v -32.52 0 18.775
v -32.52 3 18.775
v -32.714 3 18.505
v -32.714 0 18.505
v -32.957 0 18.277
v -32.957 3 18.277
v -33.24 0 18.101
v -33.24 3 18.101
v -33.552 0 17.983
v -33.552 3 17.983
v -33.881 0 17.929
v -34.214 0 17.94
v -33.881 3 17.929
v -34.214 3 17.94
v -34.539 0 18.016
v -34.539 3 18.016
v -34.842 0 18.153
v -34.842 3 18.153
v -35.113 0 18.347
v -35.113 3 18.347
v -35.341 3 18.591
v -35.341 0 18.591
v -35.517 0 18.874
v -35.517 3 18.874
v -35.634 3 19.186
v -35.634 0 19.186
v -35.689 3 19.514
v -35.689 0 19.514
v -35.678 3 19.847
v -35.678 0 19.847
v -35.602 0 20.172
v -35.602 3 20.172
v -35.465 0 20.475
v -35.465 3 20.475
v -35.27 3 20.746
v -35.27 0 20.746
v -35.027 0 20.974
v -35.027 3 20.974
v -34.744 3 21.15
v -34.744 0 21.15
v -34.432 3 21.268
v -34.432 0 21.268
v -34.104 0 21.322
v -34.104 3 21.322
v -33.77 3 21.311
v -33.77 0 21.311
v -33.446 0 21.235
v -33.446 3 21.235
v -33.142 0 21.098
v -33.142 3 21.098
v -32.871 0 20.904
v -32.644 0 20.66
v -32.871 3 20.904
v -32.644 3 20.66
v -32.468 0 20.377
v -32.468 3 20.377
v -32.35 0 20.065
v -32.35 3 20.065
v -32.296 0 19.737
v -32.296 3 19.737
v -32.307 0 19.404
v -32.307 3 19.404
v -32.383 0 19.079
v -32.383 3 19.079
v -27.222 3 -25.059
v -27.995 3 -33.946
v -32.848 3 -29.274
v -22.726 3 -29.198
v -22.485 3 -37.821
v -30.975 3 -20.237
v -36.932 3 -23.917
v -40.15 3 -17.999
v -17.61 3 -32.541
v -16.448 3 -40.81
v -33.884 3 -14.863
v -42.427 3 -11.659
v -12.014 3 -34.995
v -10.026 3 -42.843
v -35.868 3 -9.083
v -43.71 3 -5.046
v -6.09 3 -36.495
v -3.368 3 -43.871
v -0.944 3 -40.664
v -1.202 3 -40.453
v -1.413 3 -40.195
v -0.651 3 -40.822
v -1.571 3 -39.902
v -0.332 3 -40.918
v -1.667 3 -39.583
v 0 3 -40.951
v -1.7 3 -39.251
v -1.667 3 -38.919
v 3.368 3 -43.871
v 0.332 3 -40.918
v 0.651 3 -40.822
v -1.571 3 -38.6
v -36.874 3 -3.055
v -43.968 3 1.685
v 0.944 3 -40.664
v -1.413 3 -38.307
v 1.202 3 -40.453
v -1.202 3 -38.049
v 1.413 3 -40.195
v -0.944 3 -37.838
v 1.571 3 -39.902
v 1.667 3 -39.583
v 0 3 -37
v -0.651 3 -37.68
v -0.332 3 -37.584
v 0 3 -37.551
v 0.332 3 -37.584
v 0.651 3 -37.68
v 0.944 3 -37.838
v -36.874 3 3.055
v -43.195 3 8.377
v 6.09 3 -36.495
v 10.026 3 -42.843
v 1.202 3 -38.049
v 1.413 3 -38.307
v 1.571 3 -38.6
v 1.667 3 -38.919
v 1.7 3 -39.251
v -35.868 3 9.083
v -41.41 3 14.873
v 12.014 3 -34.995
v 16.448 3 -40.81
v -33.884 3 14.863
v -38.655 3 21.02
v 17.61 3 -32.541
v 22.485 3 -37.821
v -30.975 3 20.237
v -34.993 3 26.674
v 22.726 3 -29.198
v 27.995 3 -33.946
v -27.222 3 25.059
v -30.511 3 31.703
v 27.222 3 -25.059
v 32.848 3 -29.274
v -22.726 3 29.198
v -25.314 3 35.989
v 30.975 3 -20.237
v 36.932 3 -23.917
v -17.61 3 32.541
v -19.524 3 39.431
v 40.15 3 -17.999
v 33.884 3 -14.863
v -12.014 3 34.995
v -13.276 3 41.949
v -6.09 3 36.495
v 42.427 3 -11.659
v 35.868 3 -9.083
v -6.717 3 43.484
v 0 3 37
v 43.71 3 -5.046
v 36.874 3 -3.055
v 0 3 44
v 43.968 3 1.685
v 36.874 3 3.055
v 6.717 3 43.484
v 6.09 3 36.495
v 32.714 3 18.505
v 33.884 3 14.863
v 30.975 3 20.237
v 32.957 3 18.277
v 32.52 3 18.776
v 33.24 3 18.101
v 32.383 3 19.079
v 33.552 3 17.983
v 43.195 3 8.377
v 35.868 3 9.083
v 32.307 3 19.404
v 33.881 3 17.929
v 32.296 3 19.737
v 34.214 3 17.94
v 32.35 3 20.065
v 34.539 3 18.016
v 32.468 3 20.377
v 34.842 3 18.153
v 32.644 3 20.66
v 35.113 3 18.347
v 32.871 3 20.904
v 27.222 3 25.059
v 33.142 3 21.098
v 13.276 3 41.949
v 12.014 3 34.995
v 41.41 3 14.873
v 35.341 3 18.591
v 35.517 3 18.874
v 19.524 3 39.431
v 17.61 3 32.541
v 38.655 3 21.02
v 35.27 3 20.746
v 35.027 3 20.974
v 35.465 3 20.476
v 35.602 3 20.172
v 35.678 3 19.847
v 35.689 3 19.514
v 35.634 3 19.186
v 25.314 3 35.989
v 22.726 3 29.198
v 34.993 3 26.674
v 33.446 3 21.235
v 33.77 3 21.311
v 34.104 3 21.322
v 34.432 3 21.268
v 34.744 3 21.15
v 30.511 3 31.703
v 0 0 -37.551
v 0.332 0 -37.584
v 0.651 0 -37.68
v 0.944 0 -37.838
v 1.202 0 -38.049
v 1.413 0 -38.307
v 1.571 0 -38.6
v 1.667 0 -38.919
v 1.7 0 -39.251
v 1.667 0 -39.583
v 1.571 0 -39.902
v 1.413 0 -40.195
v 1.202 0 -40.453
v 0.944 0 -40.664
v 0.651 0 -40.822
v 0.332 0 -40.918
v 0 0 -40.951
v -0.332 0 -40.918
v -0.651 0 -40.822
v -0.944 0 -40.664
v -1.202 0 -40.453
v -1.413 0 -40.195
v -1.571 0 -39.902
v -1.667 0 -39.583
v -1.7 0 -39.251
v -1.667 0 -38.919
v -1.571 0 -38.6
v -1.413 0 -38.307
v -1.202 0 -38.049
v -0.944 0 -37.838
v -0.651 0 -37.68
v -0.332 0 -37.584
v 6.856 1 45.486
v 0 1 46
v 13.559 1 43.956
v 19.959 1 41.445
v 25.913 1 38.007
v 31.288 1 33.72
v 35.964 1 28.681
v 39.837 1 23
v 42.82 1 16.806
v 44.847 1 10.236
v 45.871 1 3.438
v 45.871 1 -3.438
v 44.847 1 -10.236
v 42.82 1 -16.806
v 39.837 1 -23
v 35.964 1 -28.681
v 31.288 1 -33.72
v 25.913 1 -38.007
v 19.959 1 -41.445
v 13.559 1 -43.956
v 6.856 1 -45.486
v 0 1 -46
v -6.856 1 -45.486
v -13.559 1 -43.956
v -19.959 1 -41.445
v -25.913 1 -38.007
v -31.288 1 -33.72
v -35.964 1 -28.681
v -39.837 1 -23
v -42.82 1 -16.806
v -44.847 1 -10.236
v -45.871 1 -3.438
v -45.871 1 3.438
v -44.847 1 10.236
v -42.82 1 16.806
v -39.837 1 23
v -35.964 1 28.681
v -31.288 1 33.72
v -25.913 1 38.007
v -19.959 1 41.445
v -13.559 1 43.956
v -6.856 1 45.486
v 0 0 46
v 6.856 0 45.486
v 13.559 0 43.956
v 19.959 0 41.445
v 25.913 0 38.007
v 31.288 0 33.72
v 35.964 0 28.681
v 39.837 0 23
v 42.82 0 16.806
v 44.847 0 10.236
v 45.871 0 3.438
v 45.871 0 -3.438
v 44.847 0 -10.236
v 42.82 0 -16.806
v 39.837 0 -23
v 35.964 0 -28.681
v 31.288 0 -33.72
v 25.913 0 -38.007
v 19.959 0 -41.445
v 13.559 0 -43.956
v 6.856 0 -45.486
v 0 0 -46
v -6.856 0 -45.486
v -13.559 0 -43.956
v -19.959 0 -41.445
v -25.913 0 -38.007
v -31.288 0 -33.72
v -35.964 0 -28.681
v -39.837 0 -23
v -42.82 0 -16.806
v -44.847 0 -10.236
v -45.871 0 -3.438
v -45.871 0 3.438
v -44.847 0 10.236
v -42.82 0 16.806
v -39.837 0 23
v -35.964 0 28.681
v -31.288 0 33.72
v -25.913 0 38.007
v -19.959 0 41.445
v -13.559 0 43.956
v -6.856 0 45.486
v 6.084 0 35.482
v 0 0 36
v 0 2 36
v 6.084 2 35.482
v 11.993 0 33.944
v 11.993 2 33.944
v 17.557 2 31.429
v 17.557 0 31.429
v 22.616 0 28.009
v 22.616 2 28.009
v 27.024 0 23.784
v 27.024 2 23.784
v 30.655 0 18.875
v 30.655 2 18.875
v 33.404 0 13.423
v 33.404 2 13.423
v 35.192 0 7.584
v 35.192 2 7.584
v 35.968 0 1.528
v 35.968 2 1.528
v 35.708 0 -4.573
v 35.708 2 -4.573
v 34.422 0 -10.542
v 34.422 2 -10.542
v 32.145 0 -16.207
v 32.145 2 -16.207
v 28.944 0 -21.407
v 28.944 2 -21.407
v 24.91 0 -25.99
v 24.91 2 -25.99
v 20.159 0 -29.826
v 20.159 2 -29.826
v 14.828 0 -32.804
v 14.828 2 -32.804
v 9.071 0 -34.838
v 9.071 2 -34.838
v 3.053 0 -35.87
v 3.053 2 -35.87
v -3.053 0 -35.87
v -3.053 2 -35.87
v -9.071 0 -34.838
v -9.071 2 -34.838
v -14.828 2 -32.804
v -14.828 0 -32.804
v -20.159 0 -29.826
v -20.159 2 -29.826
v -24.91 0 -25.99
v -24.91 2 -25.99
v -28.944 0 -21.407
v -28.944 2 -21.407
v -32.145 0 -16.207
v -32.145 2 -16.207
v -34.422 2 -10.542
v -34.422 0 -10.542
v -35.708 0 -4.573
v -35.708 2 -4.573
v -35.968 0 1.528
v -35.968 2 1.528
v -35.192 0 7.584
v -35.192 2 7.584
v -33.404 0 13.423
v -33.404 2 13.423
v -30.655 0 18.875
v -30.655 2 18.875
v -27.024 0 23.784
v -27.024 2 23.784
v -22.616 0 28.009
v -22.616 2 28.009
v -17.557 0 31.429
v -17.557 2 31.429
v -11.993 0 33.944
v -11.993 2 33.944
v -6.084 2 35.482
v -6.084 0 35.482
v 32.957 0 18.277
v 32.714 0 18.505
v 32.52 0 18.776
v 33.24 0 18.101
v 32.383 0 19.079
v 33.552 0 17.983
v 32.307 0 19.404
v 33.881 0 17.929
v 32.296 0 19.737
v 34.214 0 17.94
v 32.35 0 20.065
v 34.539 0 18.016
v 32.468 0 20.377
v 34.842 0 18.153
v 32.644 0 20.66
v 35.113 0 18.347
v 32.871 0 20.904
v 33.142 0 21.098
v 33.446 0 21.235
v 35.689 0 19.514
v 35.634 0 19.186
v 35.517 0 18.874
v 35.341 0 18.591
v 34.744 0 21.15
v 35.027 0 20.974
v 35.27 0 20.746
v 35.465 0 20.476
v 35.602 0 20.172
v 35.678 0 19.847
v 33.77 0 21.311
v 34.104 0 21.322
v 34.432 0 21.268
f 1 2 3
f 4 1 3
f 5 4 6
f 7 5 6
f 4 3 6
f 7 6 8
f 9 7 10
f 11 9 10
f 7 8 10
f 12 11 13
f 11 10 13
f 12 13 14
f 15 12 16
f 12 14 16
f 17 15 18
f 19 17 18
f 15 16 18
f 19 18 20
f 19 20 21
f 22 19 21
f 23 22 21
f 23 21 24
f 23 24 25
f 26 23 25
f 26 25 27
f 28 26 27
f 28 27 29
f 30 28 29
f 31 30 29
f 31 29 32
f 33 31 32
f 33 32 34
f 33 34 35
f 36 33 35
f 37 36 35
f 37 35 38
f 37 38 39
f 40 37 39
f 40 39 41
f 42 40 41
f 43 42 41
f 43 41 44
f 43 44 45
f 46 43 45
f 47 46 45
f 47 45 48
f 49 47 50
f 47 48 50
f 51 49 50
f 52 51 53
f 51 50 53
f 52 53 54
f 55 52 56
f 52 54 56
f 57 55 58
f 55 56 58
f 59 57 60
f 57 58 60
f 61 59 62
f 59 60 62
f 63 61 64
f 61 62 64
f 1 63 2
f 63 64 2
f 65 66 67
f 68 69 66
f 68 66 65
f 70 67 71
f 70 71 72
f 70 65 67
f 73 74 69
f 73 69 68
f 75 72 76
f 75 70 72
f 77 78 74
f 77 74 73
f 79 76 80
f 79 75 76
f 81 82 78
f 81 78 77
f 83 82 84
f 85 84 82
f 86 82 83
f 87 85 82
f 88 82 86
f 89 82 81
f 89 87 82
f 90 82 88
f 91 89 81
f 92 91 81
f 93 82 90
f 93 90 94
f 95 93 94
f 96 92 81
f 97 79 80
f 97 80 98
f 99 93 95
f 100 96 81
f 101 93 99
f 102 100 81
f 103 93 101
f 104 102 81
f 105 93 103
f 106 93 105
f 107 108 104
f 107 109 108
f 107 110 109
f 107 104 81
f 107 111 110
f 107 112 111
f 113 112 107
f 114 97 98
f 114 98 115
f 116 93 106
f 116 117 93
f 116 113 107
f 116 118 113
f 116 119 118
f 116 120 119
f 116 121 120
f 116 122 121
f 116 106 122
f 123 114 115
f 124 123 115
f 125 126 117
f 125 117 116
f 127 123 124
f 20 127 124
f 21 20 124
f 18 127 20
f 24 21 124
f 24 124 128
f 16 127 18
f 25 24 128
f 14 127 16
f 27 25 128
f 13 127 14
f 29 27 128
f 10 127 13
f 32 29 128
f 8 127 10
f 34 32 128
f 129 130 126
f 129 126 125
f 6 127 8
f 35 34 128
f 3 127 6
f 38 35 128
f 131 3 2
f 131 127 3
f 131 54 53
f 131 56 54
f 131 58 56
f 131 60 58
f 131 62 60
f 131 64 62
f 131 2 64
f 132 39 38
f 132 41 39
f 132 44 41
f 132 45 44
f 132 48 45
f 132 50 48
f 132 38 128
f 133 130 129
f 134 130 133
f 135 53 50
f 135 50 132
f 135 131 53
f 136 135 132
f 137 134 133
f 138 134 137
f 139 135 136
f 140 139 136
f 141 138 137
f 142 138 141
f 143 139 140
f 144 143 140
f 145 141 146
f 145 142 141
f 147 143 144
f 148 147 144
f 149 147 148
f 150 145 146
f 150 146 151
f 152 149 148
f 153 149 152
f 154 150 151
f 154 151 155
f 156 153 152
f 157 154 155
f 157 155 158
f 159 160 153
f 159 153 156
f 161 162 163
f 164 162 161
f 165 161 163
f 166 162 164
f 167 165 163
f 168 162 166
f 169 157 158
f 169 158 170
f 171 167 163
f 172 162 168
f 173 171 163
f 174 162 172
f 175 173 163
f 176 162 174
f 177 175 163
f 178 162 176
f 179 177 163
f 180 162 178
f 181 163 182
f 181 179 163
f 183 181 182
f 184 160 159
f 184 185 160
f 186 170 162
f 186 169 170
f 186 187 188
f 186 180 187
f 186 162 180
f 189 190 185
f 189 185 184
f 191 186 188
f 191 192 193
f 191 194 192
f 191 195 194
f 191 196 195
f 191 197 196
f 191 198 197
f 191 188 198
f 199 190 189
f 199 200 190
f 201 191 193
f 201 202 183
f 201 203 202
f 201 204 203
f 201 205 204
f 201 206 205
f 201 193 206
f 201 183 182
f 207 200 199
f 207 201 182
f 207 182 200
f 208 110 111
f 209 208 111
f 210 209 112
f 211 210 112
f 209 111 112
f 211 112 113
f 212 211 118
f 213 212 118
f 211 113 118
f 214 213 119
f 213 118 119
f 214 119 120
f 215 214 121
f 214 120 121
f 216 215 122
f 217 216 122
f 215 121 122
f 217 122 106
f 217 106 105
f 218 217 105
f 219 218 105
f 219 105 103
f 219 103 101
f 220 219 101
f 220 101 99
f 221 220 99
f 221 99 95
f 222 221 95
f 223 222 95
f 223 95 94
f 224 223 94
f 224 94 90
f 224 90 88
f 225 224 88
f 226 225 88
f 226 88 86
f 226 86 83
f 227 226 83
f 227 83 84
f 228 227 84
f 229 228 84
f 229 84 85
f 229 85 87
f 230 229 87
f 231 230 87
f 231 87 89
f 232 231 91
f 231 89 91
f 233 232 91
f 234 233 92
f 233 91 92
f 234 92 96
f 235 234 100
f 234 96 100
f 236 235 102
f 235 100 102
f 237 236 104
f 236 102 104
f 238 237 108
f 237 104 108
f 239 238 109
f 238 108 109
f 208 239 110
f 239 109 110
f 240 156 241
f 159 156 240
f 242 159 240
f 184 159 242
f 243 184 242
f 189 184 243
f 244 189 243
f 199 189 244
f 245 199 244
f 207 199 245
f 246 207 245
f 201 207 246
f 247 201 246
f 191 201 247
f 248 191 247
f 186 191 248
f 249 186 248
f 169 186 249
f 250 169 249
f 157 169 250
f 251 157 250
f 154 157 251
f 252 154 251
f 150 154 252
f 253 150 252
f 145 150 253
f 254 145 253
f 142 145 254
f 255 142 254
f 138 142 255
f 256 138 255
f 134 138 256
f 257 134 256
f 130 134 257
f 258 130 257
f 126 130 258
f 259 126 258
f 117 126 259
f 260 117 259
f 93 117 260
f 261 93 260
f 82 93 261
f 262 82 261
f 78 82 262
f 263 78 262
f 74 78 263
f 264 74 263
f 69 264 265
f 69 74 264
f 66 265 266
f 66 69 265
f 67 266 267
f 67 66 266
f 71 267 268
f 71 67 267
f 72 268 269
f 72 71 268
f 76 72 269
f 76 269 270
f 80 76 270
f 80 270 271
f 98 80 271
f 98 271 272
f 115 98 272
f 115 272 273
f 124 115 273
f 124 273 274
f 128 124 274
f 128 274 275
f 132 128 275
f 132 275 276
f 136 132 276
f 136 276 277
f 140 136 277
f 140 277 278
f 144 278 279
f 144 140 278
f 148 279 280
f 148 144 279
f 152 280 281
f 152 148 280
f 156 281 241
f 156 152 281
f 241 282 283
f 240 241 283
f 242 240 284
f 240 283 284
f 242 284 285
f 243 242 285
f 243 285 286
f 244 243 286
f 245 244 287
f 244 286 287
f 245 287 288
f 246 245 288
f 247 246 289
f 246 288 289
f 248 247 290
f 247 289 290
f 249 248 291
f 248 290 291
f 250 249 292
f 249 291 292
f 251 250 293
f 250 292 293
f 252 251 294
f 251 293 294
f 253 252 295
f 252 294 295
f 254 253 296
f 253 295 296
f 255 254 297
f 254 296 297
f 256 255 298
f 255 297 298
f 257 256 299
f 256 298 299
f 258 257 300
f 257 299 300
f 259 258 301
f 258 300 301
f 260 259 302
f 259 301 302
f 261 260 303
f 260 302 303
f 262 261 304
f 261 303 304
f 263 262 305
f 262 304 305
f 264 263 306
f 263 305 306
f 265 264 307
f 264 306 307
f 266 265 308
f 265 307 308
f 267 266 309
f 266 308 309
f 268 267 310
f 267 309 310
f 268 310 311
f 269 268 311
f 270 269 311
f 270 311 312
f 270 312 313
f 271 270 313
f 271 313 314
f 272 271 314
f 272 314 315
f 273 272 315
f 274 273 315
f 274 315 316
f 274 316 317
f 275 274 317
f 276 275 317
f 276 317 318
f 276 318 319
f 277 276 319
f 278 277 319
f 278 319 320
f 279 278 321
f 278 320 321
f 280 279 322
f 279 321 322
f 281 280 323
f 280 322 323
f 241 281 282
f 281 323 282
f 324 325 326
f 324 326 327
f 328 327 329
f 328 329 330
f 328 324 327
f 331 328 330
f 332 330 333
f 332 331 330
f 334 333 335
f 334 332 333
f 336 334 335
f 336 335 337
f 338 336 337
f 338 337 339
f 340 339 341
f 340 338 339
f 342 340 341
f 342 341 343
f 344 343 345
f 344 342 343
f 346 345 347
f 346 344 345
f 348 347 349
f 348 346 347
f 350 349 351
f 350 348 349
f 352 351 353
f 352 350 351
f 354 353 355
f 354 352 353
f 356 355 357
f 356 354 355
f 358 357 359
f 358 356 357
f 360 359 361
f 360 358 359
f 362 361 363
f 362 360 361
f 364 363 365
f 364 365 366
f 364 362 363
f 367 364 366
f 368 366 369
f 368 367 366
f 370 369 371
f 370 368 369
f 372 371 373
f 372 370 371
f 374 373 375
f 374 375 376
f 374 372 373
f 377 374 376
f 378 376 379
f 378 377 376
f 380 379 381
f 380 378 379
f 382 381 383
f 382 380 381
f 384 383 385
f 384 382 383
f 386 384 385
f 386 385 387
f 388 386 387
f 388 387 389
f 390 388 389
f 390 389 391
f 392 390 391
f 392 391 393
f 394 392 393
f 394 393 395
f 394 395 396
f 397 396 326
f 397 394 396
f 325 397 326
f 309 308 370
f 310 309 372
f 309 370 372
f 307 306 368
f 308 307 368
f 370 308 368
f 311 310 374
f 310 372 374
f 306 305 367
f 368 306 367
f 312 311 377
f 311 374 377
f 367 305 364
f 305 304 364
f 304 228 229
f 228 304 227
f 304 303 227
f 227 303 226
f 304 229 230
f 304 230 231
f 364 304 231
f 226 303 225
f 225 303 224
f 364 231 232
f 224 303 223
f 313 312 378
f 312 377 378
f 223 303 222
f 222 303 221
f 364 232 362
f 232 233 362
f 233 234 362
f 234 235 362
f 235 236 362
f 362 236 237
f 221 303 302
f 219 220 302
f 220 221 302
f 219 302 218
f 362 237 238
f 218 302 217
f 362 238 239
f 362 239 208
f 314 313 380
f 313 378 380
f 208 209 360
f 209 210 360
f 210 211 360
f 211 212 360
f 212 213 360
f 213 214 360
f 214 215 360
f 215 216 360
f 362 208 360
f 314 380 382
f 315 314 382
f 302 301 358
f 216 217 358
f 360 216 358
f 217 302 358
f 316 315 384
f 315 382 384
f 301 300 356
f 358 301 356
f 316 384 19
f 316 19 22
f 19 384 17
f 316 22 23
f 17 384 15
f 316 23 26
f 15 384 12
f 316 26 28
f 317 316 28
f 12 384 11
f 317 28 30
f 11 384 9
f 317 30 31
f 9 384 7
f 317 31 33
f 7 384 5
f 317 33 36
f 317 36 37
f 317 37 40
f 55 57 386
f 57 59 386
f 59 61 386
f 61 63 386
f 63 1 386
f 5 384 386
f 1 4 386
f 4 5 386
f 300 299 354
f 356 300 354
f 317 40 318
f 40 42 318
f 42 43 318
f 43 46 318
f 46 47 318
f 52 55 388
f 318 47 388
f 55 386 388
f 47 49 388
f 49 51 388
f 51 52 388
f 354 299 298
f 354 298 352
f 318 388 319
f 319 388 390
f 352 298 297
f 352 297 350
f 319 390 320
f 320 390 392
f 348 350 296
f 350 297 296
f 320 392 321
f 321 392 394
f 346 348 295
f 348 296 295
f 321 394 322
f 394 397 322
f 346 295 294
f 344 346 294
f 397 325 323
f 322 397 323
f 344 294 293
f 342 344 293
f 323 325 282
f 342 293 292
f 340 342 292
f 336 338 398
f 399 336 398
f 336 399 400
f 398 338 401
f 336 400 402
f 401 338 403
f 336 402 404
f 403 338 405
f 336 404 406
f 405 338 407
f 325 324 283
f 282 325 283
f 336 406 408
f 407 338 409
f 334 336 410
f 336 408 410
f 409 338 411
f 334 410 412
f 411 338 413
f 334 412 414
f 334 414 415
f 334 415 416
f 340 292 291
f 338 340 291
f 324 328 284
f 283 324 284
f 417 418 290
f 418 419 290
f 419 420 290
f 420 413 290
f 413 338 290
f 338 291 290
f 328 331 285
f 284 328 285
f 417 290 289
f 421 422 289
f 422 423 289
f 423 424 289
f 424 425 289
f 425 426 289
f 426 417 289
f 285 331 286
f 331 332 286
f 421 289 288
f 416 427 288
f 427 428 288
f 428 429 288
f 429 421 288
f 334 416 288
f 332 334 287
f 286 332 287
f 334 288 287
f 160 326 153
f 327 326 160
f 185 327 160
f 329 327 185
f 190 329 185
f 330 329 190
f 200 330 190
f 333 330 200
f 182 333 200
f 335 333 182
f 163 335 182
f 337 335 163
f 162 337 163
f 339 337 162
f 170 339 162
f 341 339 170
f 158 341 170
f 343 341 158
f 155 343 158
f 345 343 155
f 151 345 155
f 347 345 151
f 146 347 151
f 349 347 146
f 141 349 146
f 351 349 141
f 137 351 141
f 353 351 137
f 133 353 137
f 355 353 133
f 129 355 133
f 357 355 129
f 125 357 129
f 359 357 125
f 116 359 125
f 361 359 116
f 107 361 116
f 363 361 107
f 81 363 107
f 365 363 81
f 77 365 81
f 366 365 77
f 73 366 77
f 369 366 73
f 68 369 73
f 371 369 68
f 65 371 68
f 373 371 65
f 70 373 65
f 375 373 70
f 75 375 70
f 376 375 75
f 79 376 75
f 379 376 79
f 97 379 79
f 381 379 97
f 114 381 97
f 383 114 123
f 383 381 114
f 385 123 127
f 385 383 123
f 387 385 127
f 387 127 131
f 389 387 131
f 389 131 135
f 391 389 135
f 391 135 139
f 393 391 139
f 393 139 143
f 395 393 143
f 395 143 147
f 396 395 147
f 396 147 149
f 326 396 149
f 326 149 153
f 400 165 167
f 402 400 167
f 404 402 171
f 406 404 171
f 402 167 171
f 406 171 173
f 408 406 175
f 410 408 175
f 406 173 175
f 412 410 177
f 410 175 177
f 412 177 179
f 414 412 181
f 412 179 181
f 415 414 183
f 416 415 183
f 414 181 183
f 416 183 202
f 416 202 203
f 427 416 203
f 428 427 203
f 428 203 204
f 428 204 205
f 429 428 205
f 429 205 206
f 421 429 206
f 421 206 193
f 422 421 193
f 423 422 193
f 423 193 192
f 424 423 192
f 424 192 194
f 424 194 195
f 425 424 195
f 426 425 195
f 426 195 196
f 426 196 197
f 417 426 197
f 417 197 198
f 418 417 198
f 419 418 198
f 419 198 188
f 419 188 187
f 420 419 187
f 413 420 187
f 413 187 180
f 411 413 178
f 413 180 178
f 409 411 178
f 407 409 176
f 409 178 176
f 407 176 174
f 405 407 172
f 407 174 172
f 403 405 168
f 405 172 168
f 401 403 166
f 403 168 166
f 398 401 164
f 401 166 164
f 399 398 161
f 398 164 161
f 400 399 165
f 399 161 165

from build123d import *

# Parameters (mm, degrees)
SKETCH1_R           = 46
SKETCH1_R_2         = 36
BOSS_EXTRUDE1_DEPTH = 3
CHAMFER1_SIZE       = 2
SKETCH2_R           = 1.7
CUT_EXTRUDE1_DEPTH  = 66.122960621
CIRPATTERN1_COUNT   = 3
CHAMFER2_SIZE       = 1


with BuildPart() as part:
    # Sketch1 → Boss-Extrude1 (new body)
    with BuildSketch(Plane(origin=(0, 0, 0), x_dir=(1, 0, 0), z_dir=(0, 1, 0))):
        with Locations(Location((0, 0, 0), (0, 0, 270))):
            Circle(SKETCH1_R)
        with Locations(Location((0, 0, 0), (0, 0, 270))):
            Circle(SKETCH1_R_2, mode=Mode.SUBTRACT)
    extrude(amount=BOSS_EXTRUDE1_DEPTH)

    # Chamfer1
    chamfer1_edges = [part.edges().sort_by_distance(p)[0] for p in [
        (0, 3, -46),
    ]]
    chamfer(chamfer1_edges, length=CHAMFER1_SIZE)

    # Sketch2 → Cut-Extrude1 (cut, through all)
    with BuildSketch(Plane(origin=(0, 3, 0), x_dir=(1, 0, 0), z_dir=(0, 1, 0))):
        with Locations(Location((0, 39.251, 0), (0, 0, 270))):
            Circle(SKETCH2_R)
    cut_extrude1 = extrude(amount=-CUT_EXTRUDE1_DEPTH, mode=Mode.SUBTRACT)

    # CirPattern1: Cut-Extrude1 ×3 about axis
    cirpattern1_axis = Axis((0, 0, 0), (0, 1, 0))
    for i in range(1, CIRPATTERN1_COUNT):
        add(cut_extrude1.rotate(cirpattern1_axis, i * 360 / CIRPATTERN1_COUNT), mode=Mode.SUBTRACT)

    # Chamfer2
    chamfer2_edges = [part.edges().sort_by_distance(p)[0] for p in [
        (0, 3, -36),
    ]]
    chamfer(chamfer2_edges, length=CHAMFER2_SIZE)


solid = part.part
